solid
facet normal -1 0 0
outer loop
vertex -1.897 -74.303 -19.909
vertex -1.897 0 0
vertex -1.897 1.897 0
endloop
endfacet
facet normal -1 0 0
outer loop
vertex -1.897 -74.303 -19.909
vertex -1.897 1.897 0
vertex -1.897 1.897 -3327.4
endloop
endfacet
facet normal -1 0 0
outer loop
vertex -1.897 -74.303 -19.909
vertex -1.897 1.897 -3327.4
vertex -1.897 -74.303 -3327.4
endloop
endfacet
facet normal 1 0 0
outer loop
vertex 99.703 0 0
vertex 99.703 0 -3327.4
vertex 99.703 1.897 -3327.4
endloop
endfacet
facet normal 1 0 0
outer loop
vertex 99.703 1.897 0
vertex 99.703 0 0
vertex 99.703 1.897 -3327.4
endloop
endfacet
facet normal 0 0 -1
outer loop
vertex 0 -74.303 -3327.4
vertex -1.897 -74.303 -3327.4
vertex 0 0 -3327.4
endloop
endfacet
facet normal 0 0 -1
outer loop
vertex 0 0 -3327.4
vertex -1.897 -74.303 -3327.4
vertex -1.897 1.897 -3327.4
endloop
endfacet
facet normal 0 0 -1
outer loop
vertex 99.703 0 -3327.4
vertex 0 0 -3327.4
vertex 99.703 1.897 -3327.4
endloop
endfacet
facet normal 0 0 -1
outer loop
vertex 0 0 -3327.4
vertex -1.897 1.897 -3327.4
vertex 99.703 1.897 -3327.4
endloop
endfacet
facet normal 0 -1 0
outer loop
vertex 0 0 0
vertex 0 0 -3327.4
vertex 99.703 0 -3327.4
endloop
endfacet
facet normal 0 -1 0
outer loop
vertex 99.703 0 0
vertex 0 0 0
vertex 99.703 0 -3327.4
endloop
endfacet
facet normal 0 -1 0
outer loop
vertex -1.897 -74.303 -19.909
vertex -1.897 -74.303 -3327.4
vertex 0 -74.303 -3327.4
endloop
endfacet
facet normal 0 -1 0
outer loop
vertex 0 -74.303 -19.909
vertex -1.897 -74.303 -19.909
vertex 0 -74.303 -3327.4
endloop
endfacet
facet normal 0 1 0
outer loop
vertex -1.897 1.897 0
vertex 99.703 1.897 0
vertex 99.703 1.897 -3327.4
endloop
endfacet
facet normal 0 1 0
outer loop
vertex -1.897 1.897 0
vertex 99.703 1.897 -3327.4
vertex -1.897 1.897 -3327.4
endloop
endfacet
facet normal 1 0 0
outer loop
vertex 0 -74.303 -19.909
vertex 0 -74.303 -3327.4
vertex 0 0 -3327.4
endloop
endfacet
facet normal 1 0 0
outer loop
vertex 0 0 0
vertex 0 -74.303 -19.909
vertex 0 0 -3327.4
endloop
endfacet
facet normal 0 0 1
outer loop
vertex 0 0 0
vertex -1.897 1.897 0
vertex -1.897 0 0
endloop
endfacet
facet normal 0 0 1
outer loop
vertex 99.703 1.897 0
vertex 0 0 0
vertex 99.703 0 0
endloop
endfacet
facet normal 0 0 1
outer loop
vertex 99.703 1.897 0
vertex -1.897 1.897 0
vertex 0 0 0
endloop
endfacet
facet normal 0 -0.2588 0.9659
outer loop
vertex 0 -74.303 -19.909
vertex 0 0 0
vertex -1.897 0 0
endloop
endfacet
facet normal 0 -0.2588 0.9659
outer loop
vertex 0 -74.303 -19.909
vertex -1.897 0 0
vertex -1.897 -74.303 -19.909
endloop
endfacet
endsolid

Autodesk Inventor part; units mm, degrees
ref_plane "YZ Plane" through (0, 0, 0) normal (1, 0, 0) x (0, 1, 0)
ref_plane "XZ Plane" through (0, 0, 0) normal (0, 1, 0) x (-1, 0, 0)
ref_plane "XY Plane" through (0, 0, 0) normal (0, 0, 1) x (1, 0, 0)
sketch "Sketch1" plane through (0, 0, 0) normal (0, 0, 1) x (1, 0, 0)
  line L0 (-1.8974, -23.3494) -> (-1.8974, -74.3026)
  line L1 (-1.8974, -74.3026) -> (0, -74.3026)
  line L2 (0, -74.3026) -> (0, 0)
  line L3 (0, 0) -> (99.7026, 0)
  line L4 (99.7026, 0) -> (99.7026, 1.8974)
  line L5 (99.7026, 1.8974) -> (-1.8974, 1.8974)
  line L6 (-1.8974, 1.8974) -> (-1.8974, -23.3494)
  dimension "d0" = 101.6
  dimension "d1" = 76.2
  dimension "d2" = 1.8974
  dimension "d3" = 1.8974
extrude "Extrusion1" add sketch "Sketch1" against normal blind 3327.4
sketch "Sketch2" plane through (0, -74.3026, 0) normal (1, 0, 0) x (0, 0, -1)
  line L0 (0, 74.3026) -> (0, 0) projected
  line L1 (0, 74.3026) -> (19.9093, 0)
  line L2 (19.9093, 0) -> (0, 0)
  line L3 (0, 0) -> (0, 74.3026)
  dimension "d9" = 15
extrude "Extrusion2" cut sketch "Sketch2" against normal up to next
properties part number "Angle--Front"
